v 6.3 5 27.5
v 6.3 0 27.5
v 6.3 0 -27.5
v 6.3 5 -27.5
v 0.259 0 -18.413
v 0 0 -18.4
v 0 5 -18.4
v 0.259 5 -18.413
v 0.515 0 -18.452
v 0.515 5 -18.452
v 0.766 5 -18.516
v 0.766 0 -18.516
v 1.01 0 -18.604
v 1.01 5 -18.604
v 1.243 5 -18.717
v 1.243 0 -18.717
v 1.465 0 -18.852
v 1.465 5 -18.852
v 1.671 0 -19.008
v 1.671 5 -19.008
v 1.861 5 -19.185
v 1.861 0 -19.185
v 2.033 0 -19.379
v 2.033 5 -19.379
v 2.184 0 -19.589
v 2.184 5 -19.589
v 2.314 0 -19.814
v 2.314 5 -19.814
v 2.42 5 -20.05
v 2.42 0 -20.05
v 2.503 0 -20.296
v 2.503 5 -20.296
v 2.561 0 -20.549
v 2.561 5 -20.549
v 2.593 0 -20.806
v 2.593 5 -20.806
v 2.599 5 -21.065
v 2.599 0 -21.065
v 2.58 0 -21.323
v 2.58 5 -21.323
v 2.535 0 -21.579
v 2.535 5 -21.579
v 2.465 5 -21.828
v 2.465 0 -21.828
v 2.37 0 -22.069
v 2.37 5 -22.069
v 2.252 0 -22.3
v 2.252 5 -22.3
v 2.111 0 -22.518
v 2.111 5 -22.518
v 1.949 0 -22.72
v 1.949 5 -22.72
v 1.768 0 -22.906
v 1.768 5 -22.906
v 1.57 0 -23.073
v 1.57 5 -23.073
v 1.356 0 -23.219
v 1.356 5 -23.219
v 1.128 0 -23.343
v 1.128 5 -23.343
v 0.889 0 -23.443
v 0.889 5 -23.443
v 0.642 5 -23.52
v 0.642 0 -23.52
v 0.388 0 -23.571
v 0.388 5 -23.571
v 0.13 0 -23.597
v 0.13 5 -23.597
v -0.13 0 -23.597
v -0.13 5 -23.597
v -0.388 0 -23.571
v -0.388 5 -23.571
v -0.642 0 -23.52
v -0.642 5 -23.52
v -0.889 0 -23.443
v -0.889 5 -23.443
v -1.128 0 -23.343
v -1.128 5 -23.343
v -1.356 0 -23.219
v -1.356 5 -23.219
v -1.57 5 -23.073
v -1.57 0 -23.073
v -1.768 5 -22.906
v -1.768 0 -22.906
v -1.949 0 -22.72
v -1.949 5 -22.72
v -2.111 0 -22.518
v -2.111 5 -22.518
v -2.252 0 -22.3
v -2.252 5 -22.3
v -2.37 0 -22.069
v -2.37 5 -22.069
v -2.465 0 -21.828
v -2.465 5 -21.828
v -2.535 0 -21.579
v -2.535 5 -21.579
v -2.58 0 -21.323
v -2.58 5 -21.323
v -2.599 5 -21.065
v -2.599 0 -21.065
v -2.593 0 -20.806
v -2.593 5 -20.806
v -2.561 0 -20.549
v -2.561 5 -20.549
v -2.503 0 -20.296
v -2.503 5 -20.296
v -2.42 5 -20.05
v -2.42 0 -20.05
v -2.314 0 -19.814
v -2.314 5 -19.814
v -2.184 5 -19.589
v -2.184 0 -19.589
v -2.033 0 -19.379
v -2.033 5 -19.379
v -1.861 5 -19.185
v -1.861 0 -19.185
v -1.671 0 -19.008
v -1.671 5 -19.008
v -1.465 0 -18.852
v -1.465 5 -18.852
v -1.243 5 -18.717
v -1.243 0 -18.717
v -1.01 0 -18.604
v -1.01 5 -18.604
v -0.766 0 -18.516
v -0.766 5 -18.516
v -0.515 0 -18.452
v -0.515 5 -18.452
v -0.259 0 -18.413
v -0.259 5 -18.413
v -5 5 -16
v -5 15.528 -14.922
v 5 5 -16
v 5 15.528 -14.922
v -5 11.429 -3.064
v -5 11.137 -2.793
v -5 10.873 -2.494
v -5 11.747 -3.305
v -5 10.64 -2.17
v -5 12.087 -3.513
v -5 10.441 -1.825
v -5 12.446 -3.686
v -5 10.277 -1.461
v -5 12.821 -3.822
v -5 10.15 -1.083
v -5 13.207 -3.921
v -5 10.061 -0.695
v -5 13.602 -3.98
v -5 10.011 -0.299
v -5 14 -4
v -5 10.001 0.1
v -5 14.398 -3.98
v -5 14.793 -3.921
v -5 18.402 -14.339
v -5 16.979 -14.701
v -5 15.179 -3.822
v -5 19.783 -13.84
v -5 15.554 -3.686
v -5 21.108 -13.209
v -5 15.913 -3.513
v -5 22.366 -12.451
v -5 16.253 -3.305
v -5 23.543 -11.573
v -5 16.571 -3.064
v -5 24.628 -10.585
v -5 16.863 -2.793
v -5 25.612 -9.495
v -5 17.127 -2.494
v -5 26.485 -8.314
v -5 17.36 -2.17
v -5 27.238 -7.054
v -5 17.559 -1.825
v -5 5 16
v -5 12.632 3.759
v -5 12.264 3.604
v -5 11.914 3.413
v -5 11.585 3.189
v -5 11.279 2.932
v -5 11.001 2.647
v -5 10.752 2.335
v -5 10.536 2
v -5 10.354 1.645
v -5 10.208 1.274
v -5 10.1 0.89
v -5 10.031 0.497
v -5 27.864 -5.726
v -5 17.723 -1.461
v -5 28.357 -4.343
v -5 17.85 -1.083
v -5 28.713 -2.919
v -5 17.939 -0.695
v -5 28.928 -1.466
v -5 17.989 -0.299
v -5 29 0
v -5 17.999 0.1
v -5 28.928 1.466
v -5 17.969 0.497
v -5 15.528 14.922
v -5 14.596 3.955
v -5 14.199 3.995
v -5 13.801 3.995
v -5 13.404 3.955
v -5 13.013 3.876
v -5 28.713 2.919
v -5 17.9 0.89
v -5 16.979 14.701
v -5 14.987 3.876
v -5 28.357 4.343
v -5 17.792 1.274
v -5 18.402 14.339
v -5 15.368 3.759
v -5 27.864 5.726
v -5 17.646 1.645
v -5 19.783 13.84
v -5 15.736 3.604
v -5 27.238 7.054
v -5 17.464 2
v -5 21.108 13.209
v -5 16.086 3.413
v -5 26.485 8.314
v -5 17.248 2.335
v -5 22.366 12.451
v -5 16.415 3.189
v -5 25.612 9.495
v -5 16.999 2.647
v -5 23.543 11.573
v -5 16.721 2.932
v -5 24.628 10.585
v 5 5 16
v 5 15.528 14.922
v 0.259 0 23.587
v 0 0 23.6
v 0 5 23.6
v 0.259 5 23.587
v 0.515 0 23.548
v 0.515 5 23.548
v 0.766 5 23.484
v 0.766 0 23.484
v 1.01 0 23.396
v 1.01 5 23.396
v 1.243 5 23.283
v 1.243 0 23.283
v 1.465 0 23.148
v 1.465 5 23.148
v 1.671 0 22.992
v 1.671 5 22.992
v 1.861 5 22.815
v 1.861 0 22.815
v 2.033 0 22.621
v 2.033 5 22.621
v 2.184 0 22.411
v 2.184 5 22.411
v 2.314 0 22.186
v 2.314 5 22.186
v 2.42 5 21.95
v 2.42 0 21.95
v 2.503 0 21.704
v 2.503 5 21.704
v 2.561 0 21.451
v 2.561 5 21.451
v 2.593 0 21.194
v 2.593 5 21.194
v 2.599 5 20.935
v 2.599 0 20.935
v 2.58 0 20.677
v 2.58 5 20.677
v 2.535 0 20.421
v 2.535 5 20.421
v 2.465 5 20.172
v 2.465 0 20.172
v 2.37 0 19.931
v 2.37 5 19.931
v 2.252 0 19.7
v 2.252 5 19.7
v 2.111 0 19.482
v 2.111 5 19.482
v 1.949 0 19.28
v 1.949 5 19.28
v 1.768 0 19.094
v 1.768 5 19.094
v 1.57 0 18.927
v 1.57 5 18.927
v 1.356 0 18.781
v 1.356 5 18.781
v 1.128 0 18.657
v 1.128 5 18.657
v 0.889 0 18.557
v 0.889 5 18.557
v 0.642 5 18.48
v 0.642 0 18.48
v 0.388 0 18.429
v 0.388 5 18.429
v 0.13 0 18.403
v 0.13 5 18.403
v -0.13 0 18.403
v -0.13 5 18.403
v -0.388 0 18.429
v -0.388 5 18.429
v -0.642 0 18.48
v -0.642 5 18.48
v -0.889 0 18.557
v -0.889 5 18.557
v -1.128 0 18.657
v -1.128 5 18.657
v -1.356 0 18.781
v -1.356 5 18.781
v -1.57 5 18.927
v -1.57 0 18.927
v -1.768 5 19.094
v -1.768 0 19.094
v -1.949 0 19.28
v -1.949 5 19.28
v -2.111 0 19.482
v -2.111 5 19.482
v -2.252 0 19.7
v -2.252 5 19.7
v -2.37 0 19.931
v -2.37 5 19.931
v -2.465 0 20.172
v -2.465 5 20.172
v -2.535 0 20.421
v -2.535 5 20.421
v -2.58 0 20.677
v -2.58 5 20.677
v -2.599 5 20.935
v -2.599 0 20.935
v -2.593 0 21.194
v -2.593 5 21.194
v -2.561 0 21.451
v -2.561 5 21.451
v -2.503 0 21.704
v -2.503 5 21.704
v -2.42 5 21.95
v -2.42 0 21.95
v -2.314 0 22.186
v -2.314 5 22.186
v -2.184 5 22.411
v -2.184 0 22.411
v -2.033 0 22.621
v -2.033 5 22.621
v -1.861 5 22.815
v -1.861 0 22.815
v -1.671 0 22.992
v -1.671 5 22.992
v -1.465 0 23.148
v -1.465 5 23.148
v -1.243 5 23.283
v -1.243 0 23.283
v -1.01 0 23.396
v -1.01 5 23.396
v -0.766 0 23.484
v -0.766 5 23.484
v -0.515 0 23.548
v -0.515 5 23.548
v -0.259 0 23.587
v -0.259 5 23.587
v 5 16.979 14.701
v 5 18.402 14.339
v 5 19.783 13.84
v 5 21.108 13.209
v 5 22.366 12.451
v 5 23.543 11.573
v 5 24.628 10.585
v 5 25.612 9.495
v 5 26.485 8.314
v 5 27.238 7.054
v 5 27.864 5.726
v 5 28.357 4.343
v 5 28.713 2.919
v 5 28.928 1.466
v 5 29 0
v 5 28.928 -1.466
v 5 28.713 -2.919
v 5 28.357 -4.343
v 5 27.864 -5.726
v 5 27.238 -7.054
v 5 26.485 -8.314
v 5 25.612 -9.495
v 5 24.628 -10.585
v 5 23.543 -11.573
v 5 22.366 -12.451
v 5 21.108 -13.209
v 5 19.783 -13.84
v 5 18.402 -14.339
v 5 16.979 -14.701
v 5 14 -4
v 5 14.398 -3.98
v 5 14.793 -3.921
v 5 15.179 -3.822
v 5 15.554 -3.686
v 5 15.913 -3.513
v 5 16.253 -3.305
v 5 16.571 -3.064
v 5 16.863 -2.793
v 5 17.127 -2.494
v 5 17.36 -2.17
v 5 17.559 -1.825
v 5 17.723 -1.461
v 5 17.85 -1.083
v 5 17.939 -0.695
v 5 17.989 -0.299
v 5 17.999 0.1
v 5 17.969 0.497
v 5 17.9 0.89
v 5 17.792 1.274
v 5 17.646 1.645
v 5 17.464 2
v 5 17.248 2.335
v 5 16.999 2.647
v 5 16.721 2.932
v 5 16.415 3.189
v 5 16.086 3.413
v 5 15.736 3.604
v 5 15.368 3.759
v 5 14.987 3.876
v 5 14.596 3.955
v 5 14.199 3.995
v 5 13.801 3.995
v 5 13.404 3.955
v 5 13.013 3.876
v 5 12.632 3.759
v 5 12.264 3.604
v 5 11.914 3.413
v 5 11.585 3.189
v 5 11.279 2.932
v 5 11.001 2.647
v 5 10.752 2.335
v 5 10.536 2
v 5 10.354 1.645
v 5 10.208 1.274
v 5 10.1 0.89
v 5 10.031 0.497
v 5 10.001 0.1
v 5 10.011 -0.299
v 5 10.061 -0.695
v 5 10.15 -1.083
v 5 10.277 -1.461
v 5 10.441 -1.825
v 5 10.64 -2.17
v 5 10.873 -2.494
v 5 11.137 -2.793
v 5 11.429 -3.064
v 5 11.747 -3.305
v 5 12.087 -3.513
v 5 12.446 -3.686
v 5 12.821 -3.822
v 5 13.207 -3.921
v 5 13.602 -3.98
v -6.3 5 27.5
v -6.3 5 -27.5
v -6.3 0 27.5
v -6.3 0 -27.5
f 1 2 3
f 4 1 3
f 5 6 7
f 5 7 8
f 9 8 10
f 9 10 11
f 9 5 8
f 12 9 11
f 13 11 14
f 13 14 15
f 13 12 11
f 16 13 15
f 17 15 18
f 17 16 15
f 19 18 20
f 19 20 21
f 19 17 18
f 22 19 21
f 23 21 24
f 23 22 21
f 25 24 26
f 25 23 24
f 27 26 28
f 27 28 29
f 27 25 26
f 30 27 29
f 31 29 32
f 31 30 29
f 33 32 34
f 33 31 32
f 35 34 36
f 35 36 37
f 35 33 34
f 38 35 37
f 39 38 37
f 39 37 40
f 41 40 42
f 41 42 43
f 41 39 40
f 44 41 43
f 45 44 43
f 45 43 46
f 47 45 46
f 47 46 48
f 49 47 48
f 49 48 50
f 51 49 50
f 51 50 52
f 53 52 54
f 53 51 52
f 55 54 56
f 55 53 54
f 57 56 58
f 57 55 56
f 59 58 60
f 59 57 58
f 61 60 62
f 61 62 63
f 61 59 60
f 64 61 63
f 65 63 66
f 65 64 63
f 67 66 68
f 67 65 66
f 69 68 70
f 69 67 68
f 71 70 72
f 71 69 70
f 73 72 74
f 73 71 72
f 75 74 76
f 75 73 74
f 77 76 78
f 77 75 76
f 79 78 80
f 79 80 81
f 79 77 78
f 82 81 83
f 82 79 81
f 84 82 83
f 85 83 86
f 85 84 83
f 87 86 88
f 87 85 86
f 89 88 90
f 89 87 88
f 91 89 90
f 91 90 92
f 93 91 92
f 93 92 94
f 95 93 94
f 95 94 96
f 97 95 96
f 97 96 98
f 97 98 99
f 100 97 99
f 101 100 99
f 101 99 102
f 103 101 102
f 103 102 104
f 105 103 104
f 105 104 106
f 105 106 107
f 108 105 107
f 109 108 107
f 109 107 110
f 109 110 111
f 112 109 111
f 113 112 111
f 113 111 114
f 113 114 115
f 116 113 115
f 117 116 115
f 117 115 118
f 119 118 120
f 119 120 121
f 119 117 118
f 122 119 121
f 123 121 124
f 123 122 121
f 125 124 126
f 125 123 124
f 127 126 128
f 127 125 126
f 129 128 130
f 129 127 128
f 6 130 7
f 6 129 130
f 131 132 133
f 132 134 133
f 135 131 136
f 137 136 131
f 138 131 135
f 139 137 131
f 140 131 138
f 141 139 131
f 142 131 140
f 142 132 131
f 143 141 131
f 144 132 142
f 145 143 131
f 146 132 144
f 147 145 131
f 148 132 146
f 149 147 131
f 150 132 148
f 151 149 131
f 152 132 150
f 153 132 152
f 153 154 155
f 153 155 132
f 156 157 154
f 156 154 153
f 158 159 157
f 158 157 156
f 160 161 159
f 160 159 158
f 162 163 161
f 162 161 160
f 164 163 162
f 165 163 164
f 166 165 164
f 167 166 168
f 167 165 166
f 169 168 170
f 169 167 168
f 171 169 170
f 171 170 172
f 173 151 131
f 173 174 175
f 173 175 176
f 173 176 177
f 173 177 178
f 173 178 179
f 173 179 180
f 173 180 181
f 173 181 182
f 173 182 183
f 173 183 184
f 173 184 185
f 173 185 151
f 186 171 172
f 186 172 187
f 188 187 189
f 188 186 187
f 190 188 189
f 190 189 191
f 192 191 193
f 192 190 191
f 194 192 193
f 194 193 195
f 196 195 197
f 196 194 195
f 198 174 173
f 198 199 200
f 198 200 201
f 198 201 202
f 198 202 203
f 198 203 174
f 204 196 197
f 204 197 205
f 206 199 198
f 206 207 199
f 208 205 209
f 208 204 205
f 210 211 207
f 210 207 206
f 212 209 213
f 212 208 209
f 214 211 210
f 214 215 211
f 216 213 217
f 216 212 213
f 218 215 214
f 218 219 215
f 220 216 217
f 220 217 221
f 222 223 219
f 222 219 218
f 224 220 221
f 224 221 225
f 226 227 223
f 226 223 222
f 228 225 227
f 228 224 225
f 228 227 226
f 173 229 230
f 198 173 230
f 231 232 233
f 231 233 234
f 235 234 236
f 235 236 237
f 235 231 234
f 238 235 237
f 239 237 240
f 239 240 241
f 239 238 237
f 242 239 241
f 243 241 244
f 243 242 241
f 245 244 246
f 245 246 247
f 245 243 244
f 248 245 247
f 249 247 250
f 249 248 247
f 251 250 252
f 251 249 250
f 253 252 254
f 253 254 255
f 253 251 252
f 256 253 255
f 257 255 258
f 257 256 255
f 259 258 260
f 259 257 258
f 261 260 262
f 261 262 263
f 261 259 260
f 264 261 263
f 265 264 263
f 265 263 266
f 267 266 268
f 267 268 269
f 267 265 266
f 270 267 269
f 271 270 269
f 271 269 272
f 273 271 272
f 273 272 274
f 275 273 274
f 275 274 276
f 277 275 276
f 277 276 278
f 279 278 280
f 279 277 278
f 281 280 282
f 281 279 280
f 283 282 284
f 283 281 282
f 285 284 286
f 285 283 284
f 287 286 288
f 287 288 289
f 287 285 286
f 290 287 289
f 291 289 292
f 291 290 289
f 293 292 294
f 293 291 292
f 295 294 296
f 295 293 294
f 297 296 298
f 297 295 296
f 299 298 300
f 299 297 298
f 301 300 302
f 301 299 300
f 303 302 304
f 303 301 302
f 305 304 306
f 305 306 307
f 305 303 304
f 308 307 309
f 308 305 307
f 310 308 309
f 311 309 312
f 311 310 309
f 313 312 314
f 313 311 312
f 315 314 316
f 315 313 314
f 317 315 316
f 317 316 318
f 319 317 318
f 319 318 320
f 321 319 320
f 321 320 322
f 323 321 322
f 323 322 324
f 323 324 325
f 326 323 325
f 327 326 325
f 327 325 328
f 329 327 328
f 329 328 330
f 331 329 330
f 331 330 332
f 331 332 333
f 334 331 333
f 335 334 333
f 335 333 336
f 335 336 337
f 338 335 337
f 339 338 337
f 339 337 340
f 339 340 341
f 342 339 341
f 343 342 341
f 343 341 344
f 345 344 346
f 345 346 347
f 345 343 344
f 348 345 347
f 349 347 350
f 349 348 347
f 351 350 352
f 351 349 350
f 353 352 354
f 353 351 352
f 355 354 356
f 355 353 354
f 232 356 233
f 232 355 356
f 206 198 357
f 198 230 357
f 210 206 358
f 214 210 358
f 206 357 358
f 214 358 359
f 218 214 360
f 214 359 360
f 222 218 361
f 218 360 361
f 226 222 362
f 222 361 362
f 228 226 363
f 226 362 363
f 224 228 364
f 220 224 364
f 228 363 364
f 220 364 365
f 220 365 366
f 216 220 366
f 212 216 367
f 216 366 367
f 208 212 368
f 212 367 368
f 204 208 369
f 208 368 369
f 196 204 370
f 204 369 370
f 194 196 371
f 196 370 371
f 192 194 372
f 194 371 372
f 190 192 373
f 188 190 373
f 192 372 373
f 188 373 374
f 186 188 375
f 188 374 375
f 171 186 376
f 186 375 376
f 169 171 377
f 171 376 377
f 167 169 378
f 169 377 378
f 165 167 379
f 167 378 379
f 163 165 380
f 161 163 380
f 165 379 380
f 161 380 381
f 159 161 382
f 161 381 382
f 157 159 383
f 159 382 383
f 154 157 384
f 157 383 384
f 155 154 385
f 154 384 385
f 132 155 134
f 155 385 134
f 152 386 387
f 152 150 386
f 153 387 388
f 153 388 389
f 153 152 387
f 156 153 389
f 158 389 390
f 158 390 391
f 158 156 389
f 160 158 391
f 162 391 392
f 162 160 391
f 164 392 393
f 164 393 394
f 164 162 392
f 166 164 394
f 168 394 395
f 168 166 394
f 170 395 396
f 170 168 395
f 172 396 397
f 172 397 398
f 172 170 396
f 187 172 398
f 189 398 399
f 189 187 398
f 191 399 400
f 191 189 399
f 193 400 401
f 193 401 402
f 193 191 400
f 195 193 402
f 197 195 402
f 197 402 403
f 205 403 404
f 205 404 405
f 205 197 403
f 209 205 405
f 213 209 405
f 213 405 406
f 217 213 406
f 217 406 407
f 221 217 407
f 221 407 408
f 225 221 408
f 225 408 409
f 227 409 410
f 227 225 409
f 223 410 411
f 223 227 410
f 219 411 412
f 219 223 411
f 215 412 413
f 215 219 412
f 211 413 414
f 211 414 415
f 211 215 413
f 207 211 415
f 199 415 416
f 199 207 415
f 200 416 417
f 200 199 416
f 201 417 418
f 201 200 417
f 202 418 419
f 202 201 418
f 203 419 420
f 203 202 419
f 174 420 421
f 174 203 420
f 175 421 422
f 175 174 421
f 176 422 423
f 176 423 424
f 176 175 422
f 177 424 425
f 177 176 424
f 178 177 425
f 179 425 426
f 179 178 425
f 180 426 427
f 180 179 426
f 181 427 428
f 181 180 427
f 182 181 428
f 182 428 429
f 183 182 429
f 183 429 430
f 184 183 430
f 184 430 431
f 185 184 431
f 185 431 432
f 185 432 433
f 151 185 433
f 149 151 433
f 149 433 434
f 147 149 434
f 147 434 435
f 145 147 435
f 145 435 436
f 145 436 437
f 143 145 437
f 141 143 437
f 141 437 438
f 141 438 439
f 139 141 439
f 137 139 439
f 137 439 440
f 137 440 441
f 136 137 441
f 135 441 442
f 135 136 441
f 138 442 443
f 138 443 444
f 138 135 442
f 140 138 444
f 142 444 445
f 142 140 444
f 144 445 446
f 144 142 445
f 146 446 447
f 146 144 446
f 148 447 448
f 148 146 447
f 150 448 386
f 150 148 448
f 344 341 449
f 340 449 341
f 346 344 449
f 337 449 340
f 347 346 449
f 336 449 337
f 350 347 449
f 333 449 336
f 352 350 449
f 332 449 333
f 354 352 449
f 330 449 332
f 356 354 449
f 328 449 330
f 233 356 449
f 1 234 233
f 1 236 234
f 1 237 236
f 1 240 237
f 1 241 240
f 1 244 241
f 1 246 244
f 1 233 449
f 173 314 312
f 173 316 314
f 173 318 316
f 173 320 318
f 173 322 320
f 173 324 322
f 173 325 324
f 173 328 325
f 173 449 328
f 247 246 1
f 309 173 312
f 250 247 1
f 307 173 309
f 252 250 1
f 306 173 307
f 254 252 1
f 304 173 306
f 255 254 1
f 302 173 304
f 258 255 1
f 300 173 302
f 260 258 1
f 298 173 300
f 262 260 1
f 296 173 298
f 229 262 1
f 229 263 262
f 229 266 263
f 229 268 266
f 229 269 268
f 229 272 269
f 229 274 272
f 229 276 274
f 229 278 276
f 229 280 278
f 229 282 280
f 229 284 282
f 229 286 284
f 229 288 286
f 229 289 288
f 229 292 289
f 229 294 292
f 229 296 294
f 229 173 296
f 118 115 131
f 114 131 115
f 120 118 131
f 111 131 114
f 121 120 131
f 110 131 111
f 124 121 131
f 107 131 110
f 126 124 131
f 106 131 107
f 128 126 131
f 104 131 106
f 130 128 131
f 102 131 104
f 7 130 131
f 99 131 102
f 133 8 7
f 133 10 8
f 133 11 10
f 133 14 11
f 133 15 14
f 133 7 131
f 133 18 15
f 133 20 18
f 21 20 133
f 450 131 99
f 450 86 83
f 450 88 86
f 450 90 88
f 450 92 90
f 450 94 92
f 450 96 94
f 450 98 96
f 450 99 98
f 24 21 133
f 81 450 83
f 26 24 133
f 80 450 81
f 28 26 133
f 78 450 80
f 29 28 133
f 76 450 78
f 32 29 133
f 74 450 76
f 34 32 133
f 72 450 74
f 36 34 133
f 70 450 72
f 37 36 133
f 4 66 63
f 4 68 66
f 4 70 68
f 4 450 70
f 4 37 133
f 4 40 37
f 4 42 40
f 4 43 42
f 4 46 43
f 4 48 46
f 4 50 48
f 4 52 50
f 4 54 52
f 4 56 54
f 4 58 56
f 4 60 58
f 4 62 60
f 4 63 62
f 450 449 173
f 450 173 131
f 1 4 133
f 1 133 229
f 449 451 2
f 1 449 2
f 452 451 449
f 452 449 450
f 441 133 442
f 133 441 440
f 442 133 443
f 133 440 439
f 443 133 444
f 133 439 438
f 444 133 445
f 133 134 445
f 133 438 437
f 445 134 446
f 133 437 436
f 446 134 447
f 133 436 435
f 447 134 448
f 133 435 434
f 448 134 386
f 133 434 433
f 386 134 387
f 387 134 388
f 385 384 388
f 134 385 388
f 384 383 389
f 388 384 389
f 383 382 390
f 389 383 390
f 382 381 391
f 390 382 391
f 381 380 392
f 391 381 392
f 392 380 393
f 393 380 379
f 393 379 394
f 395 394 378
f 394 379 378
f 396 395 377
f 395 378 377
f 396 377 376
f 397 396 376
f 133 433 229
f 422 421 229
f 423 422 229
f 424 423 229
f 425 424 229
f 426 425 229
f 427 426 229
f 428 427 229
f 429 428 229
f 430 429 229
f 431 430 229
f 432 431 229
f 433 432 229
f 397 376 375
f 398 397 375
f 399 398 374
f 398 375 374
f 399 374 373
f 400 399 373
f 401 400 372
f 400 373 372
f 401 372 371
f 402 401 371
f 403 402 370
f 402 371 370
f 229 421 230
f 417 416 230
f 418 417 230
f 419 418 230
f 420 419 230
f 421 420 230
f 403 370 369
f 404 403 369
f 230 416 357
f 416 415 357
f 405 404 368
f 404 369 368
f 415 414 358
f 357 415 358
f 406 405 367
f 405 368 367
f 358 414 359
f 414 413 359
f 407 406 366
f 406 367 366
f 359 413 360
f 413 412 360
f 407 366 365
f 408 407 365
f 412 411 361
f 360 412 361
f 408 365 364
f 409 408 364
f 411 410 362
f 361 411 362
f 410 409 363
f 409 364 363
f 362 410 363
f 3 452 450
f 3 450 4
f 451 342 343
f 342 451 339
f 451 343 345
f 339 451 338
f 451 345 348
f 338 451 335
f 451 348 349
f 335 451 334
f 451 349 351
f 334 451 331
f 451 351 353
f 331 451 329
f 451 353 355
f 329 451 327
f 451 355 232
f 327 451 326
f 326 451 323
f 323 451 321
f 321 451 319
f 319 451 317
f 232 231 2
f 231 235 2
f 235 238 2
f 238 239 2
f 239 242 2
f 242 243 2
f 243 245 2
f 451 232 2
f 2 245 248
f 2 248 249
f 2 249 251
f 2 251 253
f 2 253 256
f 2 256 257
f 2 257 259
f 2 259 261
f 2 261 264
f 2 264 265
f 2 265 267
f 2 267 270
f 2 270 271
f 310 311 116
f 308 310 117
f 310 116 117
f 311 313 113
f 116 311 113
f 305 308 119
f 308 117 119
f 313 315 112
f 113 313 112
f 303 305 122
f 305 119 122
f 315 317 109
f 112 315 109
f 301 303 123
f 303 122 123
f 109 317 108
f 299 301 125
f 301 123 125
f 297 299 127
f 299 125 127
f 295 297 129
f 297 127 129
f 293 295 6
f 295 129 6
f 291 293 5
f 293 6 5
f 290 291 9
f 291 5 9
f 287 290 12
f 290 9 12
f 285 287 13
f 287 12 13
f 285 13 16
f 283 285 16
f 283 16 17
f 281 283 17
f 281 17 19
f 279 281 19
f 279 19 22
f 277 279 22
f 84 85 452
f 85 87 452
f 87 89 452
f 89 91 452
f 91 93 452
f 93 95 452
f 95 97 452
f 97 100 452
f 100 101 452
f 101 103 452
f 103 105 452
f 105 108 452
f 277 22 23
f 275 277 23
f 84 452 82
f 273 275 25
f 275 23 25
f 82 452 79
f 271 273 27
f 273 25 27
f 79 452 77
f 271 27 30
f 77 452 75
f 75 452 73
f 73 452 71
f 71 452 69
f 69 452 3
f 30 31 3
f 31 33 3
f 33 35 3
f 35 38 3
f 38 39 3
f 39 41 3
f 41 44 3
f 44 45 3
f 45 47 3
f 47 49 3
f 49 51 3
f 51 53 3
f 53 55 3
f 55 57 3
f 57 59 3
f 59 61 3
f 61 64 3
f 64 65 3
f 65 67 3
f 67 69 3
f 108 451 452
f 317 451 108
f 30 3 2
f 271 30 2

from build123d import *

# Parameters (mm, degrees)
SKETCH_1_W      = 12.6
SKETCH_1_H      = 55
SKETCH_1_R      = 2.6
EXTRUDE_1_DEPTH = 5
SKETCH_2_R      = 4
EXTRUDE_2_DEPTH = 5


with BuildPart() as part:
    # 草图1 → 凸台-拉伸1 (new body)
    with BuildSketch(Plane(origin=(0, 0, 0), x_dir=(1, 0, 0), z_dir=(0, 1, 0))):
        Rectangle(SKETCH_1_W, SKETCH_1_H)
        with Locations(Location((0, 21, 0), (0, 0, 270))):
            Circle(SKETCH_1_R, mode=Mode.SUBTRACT)
        with Locations(Location((0, -21, 0), (0, 0, 270))):
            Circle(SKETCH_1_R, mode=Mode.SUBTRACT)
    extrude(amount=EXTRUDE_1_DEPTH)

    # 草图2 → 凸台-拉伸2 (add, symmetric)
    with BuildSketch(Plane(origin=(0, 0, 0), x_dir=(0, 0, -1), z_dir=(1, 0, 0))):
        with BuildLine():
            Line((-16, 5), (-14.921975395, 15.527956257))
            ThreePointArc((-14.921975395, 15.527956257), (0, 29), (14.921975395, 15.527956257))
            Line((14.921975395, 15.527956257), (16, 5))
            Line((16, 5), (-16, 5))
        make_face()
        with Locations((0, 14)):
            Circle(SKETCH_2_R, mode=Mode.SUBTRACT)
    extrude(amount=EXTRUDE_2_DEPTH, both=True)


solid = part.part
